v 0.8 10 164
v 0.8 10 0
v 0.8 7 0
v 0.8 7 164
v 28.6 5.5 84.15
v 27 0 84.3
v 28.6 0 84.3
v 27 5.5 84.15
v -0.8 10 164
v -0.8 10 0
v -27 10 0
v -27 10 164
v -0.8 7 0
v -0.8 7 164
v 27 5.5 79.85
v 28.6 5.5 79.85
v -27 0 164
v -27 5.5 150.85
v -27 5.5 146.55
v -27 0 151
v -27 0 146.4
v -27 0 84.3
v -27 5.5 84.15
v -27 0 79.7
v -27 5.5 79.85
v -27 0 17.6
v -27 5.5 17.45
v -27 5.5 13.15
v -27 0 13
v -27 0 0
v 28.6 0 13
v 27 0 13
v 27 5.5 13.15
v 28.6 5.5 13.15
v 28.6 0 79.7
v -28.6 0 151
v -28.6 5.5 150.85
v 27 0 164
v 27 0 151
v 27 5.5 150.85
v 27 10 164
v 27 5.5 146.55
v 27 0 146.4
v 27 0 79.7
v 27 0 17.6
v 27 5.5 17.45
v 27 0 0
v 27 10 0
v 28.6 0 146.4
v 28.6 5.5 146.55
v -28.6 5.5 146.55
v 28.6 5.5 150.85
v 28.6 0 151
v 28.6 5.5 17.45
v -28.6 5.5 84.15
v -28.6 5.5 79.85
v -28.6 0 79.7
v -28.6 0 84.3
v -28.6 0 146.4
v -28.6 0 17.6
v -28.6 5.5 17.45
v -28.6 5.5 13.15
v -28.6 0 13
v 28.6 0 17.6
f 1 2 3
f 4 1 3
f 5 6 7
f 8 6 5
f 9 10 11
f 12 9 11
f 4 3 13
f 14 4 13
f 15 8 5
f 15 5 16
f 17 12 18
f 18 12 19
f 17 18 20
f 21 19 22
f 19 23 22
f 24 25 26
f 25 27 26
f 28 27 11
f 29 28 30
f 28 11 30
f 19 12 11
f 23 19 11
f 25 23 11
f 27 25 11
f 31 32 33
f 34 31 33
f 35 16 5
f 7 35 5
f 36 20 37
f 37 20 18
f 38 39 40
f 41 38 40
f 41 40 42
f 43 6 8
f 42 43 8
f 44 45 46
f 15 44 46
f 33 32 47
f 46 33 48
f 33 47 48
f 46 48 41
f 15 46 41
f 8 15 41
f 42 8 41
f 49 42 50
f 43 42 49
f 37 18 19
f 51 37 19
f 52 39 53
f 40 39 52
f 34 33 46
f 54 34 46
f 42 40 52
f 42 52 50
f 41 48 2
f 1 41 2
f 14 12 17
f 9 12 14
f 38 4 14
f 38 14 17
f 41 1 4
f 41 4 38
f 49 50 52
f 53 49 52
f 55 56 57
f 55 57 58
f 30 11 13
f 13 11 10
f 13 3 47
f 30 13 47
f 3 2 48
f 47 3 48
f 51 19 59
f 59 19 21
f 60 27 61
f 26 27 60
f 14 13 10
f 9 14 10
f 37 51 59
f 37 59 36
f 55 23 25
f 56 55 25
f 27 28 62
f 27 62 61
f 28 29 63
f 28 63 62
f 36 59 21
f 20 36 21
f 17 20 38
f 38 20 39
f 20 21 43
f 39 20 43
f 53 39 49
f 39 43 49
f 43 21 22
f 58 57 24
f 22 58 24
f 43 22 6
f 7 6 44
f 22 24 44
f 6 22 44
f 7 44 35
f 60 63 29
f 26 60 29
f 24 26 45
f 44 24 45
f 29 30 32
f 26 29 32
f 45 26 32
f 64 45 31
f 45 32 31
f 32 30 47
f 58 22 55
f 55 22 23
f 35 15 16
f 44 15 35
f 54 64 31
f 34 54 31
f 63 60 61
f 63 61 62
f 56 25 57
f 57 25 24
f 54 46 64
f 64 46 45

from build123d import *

# Parameters (mm, degrees)
BOSS_EXTRUDE1_DEPTH = 164
BOSS_EXTRUDE2_DEPTH = 1.6


with BuildPart() as part:
    # Sketch1 → Boss-Extrude1 (new body)
    with BuildSketch(Plane.XY):
        Polygon((-27, 10), (-27, 0), (27, 0), (27, 10), (0.8, 10), (0.8, 7), (-0.8, 7), (-0.8, 10), align=None)
    extrude(amount=BOSS_EXTRUDE1_DEPTH)

    # Sketch2 → Boss-Extrude2 (add)
    with BuildSketch(Plane(origin=(27, 0, 0), x_dir=(0, 0, -1), z_dir=(1, 0, 0))):
        Polygon((-151, 0), (-150.85, 5.5), (-146.55, 5.5), (-146.4, 0), align=None)
        Polygon((-13.15, 5.5), (-17.45, 5.5), (-17.6, 0), (-13, 0), align=None)
        Polygon((-84.3, 0), (-84.15, 5.5), (-79.85, 5.5), (-79.7, 0), align=None)
    boss_extrude2 = extrude(amount=BOSS_EXTRUDE2_DEPTH)

    # Mirror1: Boss-Extrude2 across plane
    add(boss_extrude2.mirror(Plane(origin=(0, 0, 0), x_dir=(0, 0, 1), z_dir=(1, 0, 0))))


solid = part.part
